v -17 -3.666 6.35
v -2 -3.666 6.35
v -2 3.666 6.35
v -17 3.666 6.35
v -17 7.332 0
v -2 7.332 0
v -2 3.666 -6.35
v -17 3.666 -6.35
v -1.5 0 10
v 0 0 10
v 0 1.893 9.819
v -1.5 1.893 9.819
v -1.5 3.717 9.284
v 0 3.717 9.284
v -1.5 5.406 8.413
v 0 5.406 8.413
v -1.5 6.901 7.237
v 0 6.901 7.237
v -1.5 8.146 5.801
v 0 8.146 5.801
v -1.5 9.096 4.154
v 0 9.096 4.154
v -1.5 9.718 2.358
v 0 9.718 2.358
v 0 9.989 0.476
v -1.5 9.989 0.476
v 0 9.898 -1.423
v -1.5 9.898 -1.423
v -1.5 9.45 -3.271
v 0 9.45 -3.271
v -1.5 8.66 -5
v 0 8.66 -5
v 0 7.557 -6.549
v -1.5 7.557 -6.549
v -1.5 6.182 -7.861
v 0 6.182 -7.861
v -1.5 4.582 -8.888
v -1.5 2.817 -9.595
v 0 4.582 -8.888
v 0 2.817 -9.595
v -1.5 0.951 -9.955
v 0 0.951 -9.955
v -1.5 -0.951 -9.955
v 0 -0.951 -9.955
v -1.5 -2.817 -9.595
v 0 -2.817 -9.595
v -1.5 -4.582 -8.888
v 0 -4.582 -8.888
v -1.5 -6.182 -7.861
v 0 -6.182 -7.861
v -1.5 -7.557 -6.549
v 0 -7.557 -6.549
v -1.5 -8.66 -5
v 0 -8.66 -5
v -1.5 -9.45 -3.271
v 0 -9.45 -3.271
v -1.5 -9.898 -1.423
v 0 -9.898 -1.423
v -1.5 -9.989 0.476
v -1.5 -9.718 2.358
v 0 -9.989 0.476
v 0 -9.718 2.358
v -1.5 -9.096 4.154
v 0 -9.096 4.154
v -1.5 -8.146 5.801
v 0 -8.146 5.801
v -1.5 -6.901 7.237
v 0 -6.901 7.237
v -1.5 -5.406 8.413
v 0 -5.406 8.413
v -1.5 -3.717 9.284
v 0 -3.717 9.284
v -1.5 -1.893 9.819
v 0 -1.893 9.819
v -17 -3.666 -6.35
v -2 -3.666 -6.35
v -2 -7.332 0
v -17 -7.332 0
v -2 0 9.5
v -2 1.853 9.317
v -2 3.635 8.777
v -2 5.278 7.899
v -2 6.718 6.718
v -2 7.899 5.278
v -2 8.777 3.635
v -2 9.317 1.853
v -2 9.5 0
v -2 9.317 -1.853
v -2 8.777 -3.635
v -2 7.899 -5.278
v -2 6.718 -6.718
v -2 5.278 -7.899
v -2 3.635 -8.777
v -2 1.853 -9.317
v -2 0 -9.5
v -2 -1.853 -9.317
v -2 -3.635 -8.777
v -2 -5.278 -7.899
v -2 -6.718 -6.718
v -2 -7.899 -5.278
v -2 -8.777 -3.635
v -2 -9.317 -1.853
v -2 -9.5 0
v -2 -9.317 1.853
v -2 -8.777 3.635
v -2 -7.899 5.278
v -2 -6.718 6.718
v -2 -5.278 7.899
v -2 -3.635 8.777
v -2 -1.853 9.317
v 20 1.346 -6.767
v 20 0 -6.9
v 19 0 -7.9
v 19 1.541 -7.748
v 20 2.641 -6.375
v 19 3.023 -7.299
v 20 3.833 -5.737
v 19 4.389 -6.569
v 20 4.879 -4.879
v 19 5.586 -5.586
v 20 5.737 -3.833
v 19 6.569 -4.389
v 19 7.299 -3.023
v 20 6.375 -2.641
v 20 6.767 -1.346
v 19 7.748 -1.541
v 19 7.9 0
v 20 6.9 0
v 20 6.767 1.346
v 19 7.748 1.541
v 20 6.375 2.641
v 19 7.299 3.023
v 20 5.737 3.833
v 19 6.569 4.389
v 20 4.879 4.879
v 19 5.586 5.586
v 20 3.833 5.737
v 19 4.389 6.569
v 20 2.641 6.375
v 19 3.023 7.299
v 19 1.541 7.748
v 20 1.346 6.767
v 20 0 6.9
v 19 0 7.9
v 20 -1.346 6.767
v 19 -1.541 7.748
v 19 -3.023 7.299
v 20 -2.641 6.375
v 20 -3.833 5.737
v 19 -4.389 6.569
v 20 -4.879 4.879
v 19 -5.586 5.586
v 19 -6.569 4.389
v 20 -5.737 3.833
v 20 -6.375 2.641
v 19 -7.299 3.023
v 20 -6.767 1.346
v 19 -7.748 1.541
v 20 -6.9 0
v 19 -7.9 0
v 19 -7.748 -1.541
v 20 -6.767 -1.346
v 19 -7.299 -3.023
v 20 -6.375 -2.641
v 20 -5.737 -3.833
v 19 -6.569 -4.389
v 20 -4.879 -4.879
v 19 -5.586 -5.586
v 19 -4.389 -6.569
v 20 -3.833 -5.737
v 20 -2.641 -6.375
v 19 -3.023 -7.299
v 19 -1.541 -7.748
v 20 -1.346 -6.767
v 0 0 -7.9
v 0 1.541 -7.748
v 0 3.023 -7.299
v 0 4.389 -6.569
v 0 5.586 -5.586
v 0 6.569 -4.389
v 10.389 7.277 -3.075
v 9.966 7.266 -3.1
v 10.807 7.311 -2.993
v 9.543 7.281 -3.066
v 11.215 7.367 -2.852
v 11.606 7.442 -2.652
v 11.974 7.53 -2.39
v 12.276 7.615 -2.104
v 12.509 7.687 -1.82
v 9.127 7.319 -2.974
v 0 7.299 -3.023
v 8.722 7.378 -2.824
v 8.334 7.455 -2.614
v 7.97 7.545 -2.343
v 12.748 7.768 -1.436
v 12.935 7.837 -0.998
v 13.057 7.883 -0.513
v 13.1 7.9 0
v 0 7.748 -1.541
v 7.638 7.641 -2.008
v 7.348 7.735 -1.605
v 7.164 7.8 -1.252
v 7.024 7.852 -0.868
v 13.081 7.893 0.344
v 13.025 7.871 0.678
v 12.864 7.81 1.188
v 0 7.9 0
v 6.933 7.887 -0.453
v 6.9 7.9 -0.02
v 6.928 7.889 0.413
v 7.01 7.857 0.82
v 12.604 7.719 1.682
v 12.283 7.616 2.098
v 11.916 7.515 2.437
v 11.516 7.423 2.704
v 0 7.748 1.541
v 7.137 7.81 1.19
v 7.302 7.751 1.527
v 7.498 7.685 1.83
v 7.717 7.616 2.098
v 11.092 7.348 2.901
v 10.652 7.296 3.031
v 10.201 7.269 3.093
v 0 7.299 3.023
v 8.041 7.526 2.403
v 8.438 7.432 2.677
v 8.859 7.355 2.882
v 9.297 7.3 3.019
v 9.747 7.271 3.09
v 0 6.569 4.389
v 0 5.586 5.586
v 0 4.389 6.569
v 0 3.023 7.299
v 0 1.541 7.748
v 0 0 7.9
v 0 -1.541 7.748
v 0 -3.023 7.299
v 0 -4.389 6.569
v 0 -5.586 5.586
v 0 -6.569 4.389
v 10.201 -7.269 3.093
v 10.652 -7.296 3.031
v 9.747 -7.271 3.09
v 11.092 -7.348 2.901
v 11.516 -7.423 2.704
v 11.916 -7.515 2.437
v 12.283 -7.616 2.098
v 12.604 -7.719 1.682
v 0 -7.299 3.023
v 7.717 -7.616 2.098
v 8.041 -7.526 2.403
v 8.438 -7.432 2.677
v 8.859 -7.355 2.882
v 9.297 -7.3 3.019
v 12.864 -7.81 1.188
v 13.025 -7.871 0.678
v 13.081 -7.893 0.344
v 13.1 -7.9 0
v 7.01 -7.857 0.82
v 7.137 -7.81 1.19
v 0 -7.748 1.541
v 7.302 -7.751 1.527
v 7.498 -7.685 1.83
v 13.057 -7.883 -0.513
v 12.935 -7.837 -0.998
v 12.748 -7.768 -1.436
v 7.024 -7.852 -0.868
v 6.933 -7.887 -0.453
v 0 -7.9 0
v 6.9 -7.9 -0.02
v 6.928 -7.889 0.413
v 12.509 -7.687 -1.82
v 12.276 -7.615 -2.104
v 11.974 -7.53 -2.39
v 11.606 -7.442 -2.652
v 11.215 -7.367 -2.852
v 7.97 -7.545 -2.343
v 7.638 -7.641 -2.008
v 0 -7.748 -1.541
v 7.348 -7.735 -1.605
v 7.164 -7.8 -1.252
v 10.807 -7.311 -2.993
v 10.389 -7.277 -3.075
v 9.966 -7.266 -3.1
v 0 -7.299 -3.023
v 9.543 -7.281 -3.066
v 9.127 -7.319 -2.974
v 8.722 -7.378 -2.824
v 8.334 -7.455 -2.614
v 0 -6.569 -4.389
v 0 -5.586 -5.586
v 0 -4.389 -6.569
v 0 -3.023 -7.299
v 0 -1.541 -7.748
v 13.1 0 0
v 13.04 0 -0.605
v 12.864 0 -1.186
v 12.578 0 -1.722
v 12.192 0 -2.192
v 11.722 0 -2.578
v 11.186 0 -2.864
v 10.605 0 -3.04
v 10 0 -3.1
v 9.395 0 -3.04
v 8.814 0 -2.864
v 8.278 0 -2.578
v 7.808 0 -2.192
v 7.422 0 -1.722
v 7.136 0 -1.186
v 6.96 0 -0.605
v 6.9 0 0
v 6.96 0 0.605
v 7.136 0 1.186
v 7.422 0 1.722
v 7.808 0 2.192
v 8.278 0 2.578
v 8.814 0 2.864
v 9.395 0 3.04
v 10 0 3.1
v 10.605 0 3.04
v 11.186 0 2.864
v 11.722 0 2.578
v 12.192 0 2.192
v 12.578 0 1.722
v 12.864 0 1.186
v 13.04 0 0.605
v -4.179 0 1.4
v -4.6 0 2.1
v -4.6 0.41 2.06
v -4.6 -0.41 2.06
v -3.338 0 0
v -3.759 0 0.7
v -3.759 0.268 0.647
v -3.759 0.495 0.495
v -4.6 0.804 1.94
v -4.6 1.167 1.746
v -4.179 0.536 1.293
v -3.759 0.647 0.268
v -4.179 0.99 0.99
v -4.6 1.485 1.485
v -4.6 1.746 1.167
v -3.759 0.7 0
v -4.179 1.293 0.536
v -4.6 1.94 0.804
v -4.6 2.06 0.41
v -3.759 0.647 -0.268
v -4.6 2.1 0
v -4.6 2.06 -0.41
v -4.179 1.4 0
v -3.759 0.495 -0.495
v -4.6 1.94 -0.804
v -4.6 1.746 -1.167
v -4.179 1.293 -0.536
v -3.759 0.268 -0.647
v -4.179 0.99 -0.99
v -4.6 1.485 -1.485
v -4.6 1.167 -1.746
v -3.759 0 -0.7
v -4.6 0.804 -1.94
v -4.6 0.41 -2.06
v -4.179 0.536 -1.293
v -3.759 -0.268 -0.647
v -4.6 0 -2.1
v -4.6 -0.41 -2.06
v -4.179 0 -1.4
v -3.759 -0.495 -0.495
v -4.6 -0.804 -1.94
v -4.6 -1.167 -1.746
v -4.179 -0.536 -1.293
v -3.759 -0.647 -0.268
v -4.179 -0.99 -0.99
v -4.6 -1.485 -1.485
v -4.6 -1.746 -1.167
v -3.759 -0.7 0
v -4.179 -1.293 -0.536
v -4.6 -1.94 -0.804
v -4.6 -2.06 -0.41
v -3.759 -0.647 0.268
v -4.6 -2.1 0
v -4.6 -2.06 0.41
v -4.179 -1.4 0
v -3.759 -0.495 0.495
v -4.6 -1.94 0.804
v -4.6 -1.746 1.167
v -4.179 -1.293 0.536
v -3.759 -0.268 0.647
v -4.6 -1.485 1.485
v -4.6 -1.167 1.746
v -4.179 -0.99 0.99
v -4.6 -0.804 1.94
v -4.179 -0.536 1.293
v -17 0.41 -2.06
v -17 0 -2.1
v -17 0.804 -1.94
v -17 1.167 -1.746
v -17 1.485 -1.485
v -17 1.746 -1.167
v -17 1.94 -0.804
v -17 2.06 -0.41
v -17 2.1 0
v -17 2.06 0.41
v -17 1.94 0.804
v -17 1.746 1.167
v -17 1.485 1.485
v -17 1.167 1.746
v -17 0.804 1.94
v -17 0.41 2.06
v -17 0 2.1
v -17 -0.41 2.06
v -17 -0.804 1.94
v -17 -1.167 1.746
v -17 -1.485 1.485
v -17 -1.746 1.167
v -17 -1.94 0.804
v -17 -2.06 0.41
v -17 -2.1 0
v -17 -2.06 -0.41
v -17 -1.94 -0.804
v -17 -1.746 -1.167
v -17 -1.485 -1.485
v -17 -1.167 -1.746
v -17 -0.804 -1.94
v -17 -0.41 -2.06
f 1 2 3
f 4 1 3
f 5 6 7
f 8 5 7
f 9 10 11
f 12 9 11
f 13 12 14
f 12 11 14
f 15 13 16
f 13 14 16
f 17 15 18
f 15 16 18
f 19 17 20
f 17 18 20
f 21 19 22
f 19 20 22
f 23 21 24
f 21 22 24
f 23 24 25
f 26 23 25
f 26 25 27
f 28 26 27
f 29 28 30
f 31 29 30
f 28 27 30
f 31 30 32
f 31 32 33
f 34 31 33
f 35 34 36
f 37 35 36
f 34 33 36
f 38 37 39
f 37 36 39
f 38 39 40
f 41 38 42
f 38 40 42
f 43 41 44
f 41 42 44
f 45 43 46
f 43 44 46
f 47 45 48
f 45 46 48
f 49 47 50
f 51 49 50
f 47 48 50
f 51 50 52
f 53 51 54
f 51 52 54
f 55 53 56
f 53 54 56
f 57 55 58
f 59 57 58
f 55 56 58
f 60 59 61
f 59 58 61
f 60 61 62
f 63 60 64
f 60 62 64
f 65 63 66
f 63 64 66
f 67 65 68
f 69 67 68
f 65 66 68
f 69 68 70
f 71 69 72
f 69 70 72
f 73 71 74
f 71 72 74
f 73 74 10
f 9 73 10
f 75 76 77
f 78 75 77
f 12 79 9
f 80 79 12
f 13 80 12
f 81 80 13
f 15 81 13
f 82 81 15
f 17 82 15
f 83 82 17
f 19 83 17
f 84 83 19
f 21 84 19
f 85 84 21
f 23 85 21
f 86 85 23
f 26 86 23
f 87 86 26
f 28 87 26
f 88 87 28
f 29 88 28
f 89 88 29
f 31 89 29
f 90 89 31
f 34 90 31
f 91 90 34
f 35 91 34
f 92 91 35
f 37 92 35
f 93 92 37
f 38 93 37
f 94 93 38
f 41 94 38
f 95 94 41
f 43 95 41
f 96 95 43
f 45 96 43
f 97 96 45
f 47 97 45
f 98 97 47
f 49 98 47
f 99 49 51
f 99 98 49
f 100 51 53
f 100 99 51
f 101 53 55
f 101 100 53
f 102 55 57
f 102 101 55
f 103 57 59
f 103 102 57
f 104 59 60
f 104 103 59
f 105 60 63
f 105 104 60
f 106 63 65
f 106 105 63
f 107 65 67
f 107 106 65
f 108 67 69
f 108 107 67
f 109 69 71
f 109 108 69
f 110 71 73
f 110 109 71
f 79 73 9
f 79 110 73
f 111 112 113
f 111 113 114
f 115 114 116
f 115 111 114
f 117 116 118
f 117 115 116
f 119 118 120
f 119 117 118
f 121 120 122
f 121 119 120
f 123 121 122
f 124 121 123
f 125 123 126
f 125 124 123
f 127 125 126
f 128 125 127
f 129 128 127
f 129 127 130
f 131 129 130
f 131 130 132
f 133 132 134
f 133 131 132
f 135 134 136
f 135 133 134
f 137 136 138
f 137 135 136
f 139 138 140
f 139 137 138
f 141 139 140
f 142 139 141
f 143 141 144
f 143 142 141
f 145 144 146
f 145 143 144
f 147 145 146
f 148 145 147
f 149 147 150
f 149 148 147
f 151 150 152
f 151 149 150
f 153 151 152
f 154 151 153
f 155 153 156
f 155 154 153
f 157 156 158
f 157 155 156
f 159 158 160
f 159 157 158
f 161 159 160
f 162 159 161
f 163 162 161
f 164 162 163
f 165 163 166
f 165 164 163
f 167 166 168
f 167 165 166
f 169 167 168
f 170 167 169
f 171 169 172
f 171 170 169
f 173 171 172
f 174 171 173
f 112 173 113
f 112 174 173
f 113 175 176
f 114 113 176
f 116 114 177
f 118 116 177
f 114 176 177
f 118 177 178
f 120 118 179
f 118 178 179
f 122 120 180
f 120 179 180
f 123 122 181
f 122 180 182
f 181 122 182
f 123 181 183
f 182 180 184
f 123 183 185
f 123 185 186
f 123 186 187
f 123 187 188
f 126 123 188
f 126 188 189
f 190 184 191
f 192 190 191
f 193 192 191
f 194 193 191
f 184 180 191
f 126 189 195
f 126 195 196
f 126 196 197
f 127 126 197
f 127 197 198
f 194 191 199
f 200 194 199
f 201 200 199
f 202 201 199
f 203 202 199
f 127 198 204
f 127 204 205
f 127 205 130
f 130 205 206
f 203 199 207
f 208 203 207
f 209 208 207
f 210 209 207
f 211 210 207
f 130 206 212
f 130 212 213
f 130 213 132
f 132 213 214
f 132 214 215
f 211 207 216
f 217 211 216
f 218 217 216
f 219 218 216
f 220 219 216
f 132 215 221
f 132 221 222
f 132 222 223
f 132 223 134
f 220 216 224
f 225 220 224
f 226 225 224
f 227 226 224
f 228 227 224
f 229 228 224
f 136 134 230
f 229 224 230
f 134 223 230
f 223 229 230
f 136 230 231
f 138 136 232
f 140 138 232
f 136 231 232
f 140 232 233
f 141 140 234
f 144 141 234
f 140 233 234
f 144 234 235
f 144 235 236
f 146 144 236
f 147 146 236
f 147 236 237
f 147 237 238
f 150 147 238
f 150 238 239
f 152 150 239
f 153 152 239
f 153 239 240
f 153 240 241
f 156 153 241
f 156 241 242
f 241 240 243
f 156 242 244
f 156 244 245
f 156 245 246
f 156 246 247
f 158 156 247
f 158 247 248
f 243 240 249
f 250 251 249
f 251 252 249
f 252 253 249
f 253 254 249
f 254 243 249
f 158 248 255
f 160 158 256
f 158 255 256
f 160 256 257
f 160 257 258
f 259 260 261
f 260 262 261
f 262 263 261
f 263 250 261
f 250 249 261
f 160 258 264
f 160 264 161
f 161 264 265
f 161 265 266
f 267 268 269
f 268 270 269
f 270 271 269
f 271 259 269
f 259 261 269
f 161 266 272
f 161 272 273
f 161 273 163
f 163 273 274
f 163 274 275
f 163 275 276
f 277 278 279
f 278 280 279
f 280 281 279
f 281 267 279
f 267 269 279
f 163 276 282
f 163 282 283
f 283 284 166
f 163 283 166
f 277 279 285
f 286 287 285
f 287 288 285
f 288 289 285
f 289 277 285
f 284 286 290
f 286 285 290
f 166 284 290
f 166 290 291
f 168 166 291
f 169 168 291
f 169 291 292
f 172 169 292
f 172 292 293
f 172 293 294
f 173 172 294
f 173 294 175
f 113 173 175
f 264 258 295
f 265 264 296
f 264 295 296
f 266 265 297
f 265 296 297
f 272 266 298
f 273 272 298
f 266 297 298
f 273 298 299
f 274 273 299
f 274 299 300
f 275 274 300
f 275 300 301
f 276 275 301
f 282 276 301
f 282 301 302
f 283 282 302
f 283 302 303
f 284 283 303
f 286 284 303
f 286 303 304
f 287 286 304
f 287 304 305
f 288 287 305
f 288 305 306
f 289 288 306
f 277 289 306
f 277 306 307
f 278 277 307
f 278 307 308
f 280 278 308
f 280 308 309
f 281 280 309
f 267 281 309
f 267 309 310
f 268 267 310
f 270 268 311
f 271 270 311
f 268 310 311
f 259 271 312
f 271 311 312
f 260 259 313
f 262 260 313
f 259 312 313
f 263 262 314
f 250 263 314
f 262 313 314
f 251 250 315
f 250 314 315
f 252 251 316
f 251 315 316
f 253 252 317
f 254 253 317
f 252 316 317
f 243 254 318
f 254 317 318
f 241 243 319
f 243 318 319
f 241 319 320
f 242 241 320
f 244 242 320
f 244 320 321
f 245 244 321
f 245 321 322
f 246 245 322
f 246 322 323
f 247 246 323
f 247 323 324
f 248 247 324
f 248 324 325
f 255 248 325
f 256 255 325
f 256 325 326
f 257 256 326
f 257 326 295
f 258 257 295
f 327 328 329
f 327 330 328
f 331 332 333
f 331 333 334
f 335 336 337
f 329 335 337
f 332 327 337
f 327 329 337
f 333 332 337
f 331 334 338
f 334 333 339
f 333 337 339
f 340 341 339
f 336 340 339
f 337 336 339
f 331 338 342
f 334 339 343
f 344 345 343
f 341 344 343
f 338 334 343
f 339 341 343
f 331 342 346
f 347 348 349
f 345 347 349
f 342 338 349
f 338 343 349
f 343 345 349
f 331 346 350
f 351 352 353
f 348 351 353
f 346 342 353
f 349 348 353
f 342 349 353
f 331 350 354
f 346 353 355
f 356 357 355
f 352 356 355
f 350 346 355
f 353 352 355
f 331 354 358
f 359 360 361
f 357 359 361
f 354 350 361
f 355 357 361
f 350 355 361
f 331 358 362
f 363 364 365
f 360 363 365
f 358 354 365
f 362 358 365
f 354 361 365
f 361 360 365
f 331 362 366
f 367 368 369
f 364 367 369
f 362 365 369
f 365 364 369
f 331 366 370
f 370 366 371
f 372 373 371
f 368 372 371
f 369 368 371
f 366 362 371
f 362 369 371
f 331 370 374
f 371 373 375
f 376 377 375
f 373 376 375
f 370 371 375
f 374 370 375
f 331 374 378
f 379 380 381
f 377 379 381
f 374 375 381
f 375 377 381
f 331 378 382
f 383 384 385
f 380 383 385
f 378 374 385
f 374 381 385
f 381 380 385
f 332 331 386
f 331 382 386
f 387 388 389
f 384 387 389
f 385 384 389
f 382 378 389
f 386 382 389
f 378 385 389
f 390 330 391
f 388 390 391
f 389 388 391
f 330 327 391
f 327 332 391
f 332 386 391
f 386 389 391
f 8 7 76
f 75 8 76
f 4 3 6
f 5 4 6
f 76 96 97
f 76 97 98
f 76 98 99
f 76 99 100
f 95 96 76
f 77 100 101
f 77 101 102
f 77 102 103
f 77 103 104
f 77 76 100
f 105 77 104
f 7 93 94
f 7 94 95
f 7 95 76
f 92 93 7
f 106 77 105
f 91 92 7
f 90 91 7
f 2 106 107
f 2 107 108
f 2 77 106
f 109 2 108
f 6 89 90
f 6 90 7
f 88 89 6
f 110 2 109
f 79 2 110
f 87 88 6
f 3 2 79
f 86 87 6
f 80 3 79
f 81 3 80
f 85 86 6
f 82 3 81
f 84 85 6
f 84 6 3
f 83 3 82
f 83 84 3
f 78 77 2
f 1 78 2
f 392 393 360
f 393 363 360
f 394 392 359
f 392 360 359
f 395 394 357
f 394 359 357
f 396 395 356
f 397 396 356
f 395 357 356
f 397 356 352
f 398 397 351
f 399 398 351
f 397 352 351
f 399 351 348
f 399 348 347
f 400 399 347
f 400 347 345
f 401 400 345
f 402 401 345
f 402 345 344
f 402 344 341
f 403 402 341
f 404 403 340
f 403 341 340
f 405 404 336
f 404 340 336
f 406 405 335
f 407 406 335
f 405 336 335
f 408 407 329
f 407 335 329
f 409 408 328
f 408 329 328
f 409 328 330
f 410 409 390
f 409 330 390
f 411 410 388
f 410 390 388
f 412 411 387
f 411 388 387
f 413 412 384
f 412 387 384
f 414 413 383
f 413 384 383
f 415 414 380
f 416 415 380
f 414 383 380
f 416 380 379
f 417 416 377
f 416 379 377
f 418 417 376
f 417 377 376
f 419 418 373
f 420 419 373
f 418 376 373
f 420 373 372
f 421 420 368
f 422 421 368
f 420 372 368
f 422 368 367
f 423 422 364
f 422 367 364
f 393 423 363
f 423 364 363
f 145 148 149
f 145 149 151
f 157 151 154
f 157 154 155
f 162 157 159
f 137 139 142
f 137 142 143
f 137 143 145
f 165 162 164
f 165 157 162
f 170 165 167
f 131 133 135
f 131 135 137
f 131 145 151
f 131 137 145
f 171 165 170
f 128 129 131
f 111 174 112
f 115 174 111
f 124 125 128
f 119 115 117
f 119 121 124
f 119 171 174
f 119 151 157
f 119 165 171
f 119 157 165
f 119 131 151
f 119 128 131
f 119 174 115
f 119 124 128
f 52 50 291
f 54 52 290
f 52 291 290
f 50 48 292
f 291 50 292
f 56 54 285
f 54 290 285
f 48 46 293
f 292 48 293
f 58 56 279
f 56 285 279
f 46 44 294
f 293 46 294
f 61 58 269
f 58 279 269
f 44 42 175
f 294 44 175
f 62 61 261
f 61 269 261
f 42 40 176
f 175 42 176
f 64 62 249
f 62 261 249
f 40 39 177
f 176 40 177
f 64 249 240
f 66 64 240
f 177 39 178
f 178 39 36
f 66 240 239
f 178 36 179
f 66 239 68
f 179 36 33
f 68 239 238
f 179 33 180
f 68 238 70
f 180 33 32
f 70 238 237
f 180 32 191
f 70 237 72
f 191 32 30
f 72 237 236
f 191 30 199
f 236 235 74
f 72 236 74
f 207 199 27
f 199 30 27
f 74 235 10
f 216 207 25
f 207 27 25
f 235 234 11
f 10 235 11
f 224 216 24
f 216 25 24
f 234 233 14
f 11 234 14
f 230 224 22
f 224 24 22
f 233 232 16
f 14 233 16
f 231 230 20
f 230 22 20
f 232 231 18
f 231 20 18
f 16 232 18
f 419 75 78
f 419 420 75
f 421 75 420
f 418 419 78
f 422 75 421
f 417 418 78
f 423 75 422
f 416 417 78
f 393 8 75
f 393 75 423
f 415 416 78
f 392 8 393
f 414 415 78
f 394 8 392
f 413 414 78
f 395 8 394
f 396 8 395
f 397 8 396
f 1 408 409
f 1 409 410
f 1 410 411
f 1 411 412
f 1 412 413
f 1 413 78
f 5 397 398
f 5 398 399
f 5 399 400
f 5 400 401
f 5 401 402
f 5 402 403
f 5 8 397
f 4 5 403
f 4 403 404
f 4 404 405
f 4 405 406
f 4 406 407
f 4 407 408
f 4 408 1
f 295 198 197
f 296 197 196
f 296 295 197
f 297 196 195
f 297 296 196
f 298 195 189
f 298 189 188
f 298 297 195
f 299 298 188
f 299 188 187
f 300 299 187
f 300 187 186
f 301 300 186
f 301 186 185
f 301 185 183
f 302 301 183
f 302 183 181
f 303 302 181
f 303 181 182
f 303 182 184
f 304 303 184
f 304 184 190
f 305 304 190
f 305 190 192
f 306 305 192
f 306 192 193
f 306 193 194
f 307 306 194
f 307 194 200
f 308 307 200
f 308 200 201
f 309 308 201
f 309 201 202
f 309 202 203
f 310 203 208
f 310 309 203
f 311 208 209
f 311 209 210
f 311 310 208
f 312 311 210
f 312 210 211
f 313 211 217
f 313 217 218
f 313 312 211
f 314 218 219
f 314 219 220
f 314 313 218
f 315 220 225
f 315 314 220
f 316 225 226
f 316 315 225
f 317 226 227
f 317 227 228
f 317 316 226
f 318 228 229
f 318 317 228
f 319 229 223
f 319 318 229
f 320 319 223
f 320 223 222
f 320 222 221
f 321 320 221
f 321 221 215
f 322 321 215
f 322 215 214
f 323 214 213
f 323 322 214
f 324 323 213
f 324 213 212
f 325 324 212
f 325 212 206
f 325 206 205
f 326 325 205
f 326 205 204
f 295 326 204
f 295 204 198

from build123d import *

# Parameters (mm, degrees)
SKETCH_1_R               = 7.9
EXTRUDE_1_DEPTH          = 20
SKETCH_3_R               = 10
EXTRUDE_2_DEPTH          = 2
EXTRUDE_3_DEPTH          = 15
CHAMFER_1_SIZE           = 0.5
M5X0_8_1_D               = 4.2
M5X0_8_1_DEPTH           = 12.4
M5X0_8_1_TIP             = 1.2618073
SKETCH_5_R               = 3.1
CUT_EXTRUDE_1_DEPTH      = 11
CUT_EXTRUDE_1_DEPTH_BACK = 11
CHAMFER_2_SIZE           = 1


with BuildPart() as part:
    # 草图1 → 凸台-拉伸1 (new body)
    with BuildSketch(Plane(origin=(0, 0, 0), x_dir=(0, 0, -1), z_dir=(1, 0, 0))):
        Circle(SKETCH_1_R)
    extrude(amount=EXTRUDE_1_DEPTH)

    # 草图3 → 凸台-拉伸2 (add)
    with BuildSketch(Plane.ZY):
        Circle(SKETCH_3_R)
    extrude(amount=EXTRUDE_2_DEPTH)

    # 草图4 → 凸台-拉伸3 (add)
    with BuildSketch(Plane.ZY.offset(2)):
        Polygon((6.35, 3.666174209), (0, 7.332348419), (-6.35, 3.666174209), (-6.35, -3.666174209), (0, -7.332348419), (6.35, -3.666174209), align=None)
    extrude(amount=EXTRUDE_3_DEPTH)

    # 倒角1
    chamfer_1_edges = [part.edges().sort_by_distance(p)[0] for p in [
        (-2, 0, -10),
    ]]
    chamfer(chamfer_1_edges, length=CHAMFER_1_SIZE)

    # M5x0.8 螺纹孔1
    with Locations(Plane.ZY.offset(17)):
        with Locations((0, 0)):
            Hole(M5X0_8_1_D / 2, depth=M5X0_8_1_DEPTH)
            with Locations((0, 0, -(M5X0_8_1_DEPTH + M5X0_8_1_TIP / 2))):  # 118° drill point
                Cone(0, M5X0_8_1_D / 2, M5X0_8_1_TIP, mode=Mode.SUBTRACT)

    # 草图5 → 切除-拉伸1 (cut, two sides)
    with BuildSketch(Plane(origin=(0, 0, 0), x_dir=(1, 0, 0), z_dir=(0, 1, 0))) as cut_extrude_1_sk:
        with Locations((10, 0)):
            Circle(SKETCH_5_R)
    extrude(amount=CUT_EXTRUDE_1_DEPTH, mode=Mode.SUBTRACT)
    extrude(cut_extrude_1_sk.sketch, amount=-CUT_EXTRUDE_1_DEPTH_BACK, mode=Mode.SUBTRACT)

    # 倒角2
    chamfer_2_edges = [part.edges().sort_by_distance(p)[0] for p in [
        (20, 0, 7.9),
    ]]
    chamfer(chamfer_2_edges, length=CHAMFER_2_SIZE)


solid = part.part
